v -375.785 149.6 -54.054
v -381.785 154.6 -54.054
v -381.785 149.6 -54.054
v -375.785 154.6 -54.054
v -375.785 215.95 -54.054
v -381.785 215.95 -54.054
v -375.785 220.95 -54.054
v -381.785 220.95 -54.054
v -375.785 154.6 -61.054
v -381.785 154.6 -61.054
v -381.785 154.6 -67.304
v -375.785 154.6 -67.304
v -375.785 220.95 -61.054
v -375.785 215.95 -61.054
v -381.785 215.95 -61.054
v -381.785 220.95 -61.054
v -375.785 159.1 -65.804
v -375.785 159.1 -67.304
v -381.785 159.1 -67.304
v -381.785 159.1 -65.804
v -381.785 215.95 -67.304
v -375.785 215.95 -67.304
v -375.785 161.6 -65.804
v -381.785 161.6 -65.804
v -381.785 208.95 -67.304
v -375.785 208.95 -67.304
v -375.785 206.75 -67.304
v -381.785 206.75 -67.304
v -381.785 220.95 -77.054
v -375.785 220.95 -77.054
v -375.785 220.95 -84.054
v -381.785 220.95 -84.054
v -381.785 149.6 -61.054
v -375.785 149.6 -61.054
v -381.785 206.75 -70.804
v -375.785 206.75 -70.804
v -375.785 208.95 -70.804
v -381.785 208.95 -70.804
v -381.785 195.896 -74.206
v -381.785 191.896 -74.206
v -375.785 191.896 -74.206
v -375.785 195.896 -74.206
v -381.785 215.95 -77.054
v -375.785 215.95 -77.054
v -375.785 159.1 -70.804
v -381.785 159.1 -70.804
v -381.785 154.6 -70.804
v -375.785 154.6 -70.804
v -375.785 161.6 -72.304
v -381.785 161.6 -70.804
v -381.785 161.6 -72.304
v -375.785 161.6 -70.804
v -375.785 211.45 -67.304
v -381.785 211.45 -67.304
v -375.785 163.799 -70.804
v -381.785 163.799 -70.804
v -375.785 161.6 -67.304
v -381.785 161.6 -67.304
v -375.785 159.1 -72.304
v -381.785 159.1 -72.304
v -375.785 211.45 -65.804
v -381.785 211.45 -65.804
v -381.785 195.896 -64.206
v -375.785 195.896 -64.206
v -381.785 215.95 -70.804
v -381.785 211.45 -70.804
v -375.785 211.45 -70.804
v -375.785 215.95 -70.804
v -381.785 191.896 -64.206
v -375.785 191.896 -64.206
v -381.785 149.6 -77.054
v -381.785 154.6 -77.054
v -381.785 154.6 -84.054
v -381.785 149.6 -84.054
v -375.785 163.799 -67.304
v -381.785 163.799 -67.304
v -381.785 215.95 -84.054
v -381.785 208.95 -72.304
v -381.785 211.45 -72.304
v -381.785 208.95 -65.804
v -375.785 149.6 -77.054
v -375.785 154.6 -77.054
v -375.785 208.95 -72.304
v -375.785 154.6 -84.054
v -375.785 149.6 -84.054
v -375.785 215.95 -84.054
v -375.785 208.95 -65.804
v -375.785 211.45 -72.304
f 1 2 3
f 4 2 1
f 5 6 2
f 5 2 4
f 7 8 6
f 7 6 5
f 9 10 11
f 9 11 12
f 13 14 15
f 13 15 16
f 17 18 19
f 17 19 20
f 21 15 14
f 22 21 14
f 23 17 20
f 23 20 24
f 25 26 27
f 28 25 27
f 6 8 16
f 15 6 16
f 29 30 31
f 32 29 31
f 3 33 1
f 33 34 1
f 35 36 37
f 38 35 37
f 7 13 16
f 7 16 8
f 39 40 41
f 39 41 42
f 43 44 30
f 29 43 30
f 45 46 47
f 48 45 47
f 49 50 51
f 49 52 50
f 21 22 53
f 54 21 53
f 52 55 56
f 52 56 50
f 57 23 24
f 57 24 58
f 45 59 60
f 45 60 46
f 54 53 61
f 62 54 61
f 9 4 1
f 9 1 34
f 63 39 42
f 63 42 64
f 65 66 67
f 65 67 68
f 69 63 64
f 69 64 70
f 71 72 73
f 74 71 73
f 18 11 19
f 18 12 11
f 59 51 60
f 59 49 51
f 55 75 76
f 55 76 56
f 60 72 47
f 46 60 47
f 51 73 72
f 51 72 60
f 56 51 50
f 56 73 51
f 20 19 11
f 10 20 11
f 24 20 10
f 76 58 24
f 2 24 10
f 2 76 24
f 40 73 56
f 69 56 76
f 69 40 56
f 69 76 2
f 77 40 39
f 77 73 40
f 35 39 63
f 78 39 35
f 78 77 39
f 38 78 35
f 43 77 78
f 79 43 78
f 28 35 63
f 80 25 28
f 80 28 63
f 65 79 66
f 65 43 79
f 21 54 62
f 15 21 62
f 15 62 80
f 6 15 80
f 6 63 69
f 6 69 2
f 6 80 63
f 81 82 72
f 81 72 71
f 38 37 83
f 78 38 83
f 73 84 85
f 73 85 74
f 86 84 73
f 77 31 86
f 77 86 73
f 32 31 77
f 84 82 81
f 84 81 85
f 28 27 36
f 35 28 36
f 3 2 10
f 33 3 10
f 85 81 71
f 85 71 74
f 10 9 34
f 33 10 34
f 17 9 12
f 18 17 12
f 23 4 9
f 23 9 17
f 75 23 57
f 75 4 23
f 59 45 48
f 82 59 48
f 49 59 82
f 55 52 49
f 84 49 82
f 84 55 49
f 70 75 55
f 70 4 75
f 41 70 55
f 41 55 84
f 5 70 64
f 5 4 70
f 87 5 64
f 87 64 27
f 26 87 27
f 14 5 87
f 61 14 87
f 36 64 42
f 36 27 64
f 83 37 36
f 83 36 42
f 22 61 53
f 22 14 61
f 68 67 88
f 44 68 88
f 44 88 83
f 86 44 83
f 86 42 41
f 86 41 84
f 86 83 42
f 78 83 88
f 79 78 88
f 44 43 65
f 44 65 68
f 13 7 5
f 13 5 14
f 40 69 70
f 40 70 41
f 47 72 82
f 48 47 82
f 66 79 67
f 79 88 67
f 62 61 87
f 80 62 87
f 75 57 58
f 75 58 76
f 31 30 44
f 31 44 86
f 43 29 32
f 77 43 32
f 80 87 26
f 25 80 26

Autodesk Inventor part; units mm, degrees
ref_plane "YZ Plane" through (0, 0, 0) normal (1, 0, 0) x (0, 1, 0)
ref_plane "XZ Plane" through (0, 0, 0) normal (0, 1, 0) x (-1, 0, 0)
ref_plane "РабПлоскость1" through (-329.2239, 210.3045, -11.0538) normal (0, -1, 0) x (1, 0, 0)
sketch "Эскиз1" plane through (-329.2239, 210.3045, -11.0538) normal (0, -1, 0) x (1, 0, 0)
  line L0 (-46.5606, -73) -> (-52.5606, -73)
  line L1 (-52.5606, -73) -> (-52.5606, -43)
  line L2 (-52.5606, -43) -> (-46.5606, -43)
  line L3 (-46.5606, -43) -> (-46.5606, -73)
  line L4 (-23.55, -78) -> (-51.55, -78) projected
  point P0 (329.2239, 11.0538)
  dimension "d0" = 6
  dimension "d1" = 30
  dimension "d2" = 5
ref_plane "РабПлоскость2" through (-464.2239, 154.5996, -124.0538) normal (0, 1, 0) x (0, 0, 1)
extrude "Выдавливание1" add sketch "Эскиз1" along normal blind 55.705 and the other way blind 5.645
sketch "Эскиз2" plane through (-375.7846, 215.9495, -54.0538) normal (1, 0, 0) x (0, 0, -1)
  line L0 (30, 0) -> (30, -61.35) projected
  line L1 (30, -30.675) -> (0, -30.675)
  line L2 (0, 0) -> (0, -61.35) projected
  line L3 (30, 0) -> (23, 0)
  line L4 (23, 0) -> (23, 5)
  line L5 (23, 5) -> (30, 5)
  line L6 (30, 5) -> (30, 0)
  line L7 (0, 0) -> (7, 0)
  line L8 (7, 0) -> (7, 5)
  line L9 (7, 5) -> (0, 5)
  line L10 (0, 5) -> (0, 0)
  line L11 (18.25, -4.5) -> (11.75, -4.5)
  line L12 (11.75, -4.5) -> (11.75, -7)
  line L13 (11.75, -7) -> (18.25, -7)
  line L14 (18.25, -7) -> (18.25, -4.5)
  line L15 (13.25, -9.1998) -> (16.75, -9.1998)
  line L16 (16.75, -9.1998) -> (16.75, 2.1998)
  line L17 (16.75, 2.1998) -> (13.25, 2.1998)
  line L18 (13.25, 2.1998) -> (13.25, -9.1998)
  line L19 (13.25, -9.1998) -> (16.75, 2.1998) construction
  line L20 (16.75, -9.1998) -> (13.25, 2.1998) construction
  line L21 (30, -61.35) -> (23, -61.35)
  line L22 (23, -61.35) -> (23, -66.35)
  line L23 (23, -66.35) -> (30, -66.35)
  line L24 (30, -66.35) -> (30, -61.35)
  line L25 (0, -61.35) -> (7, -61.35)
  line L26 (7, -61.35) -> (7, -66.35)
  line L27 (7, -66.35) -> (0, -66.35)
  line L28 (0, -66.35) -> (0, -61.35)
  line L29 (18.25, -54.35) -> (18.25, -56.85)
  line L30 (16.75, -63.5498) -> (13.25, -63.5498)
  line L31 (16.75, -52.1502) -> (16.75, -63.5498)
  line L32 (13.25, -52.1502) -> (16.75, -52.1502)
  line L33 (13.25, -52.1502) -> (16.75, -63.5498) construction
  line L34 (13.25, -63.5498) -> (13.25, -52.1502)
  line L35 (16.75, -52.1502) -> (13.25, -63.5498) construction
  line L36 (18.25, -56.85) -> (11.75, -56.85)
  line L37 (11.75, -56.85) -> (11.75, -54.35)
  line L38 (11.75, -54.35) -> (18.25, -54.35)
  point P0 (-54.0538, -215.9495)
  point P1 (0, -55.705)
  point P2 (30, -55.705)
  point P3 (15, -3.5)
  point P4 (16.75, -7)
  point P5 (16.75, -4.5)
  point P6 (13.25, -4.5)
  point P7 (13.25, -7)
  point P8 (15, -57.85)
  point P9 (16.75, -56.85)
  point P10 (16.75, -54.35)
  point P11 (13.25, -54.35)
  point P12 (13.25, -56.85)
  dimension "d23" = 5
  dimension "d24" = 7
  dimension "d25" = 7
extrude "Выдавливание2" add sketch "Эскиз2" against normal blind 6 contours L3 L4 L5 L6 | L10 L9 L8 L7 | L24 L23 L22 L21 | L25 L26 L27 L28
extrude "Выдавливание3" cut sketch "Эскиз2" against normal blind 6 contours L14 L13 L16 L11 | L16 L13 L18 L11 | L11 L18 L17 L16 | L18 L13 L12 L11 | L16 L15 L18 L13 | L29 L36 L31 L38 | L38 L34 L32 L31 | L31 L36 L34 L38 | L31 L30 L34 L36 | L34 L36 L37 L38
sketch "Эскиз6" plane through (-381.7846, 149.5995, -84.0538) normal (-1, 0, 0) x (0, 0, 1)
  line L0 (19.8477, 42.2969) -> (9.8477, 42.2969)
  line L1 (9.8477, 46.2969) -> (19.8477, 46.2969)
  line L2 (19.8477, 46.2969) -> (19.8477, 42.2969)
  line L3 (9.8477, 42.2969) -> (9.8477, 46.2969)
  point P0 (84.0538, -149.5995)
extrude "Выдавливание5" cut sketch "Эскиз6" against normal blind 6
properties part number "стенка 2"
